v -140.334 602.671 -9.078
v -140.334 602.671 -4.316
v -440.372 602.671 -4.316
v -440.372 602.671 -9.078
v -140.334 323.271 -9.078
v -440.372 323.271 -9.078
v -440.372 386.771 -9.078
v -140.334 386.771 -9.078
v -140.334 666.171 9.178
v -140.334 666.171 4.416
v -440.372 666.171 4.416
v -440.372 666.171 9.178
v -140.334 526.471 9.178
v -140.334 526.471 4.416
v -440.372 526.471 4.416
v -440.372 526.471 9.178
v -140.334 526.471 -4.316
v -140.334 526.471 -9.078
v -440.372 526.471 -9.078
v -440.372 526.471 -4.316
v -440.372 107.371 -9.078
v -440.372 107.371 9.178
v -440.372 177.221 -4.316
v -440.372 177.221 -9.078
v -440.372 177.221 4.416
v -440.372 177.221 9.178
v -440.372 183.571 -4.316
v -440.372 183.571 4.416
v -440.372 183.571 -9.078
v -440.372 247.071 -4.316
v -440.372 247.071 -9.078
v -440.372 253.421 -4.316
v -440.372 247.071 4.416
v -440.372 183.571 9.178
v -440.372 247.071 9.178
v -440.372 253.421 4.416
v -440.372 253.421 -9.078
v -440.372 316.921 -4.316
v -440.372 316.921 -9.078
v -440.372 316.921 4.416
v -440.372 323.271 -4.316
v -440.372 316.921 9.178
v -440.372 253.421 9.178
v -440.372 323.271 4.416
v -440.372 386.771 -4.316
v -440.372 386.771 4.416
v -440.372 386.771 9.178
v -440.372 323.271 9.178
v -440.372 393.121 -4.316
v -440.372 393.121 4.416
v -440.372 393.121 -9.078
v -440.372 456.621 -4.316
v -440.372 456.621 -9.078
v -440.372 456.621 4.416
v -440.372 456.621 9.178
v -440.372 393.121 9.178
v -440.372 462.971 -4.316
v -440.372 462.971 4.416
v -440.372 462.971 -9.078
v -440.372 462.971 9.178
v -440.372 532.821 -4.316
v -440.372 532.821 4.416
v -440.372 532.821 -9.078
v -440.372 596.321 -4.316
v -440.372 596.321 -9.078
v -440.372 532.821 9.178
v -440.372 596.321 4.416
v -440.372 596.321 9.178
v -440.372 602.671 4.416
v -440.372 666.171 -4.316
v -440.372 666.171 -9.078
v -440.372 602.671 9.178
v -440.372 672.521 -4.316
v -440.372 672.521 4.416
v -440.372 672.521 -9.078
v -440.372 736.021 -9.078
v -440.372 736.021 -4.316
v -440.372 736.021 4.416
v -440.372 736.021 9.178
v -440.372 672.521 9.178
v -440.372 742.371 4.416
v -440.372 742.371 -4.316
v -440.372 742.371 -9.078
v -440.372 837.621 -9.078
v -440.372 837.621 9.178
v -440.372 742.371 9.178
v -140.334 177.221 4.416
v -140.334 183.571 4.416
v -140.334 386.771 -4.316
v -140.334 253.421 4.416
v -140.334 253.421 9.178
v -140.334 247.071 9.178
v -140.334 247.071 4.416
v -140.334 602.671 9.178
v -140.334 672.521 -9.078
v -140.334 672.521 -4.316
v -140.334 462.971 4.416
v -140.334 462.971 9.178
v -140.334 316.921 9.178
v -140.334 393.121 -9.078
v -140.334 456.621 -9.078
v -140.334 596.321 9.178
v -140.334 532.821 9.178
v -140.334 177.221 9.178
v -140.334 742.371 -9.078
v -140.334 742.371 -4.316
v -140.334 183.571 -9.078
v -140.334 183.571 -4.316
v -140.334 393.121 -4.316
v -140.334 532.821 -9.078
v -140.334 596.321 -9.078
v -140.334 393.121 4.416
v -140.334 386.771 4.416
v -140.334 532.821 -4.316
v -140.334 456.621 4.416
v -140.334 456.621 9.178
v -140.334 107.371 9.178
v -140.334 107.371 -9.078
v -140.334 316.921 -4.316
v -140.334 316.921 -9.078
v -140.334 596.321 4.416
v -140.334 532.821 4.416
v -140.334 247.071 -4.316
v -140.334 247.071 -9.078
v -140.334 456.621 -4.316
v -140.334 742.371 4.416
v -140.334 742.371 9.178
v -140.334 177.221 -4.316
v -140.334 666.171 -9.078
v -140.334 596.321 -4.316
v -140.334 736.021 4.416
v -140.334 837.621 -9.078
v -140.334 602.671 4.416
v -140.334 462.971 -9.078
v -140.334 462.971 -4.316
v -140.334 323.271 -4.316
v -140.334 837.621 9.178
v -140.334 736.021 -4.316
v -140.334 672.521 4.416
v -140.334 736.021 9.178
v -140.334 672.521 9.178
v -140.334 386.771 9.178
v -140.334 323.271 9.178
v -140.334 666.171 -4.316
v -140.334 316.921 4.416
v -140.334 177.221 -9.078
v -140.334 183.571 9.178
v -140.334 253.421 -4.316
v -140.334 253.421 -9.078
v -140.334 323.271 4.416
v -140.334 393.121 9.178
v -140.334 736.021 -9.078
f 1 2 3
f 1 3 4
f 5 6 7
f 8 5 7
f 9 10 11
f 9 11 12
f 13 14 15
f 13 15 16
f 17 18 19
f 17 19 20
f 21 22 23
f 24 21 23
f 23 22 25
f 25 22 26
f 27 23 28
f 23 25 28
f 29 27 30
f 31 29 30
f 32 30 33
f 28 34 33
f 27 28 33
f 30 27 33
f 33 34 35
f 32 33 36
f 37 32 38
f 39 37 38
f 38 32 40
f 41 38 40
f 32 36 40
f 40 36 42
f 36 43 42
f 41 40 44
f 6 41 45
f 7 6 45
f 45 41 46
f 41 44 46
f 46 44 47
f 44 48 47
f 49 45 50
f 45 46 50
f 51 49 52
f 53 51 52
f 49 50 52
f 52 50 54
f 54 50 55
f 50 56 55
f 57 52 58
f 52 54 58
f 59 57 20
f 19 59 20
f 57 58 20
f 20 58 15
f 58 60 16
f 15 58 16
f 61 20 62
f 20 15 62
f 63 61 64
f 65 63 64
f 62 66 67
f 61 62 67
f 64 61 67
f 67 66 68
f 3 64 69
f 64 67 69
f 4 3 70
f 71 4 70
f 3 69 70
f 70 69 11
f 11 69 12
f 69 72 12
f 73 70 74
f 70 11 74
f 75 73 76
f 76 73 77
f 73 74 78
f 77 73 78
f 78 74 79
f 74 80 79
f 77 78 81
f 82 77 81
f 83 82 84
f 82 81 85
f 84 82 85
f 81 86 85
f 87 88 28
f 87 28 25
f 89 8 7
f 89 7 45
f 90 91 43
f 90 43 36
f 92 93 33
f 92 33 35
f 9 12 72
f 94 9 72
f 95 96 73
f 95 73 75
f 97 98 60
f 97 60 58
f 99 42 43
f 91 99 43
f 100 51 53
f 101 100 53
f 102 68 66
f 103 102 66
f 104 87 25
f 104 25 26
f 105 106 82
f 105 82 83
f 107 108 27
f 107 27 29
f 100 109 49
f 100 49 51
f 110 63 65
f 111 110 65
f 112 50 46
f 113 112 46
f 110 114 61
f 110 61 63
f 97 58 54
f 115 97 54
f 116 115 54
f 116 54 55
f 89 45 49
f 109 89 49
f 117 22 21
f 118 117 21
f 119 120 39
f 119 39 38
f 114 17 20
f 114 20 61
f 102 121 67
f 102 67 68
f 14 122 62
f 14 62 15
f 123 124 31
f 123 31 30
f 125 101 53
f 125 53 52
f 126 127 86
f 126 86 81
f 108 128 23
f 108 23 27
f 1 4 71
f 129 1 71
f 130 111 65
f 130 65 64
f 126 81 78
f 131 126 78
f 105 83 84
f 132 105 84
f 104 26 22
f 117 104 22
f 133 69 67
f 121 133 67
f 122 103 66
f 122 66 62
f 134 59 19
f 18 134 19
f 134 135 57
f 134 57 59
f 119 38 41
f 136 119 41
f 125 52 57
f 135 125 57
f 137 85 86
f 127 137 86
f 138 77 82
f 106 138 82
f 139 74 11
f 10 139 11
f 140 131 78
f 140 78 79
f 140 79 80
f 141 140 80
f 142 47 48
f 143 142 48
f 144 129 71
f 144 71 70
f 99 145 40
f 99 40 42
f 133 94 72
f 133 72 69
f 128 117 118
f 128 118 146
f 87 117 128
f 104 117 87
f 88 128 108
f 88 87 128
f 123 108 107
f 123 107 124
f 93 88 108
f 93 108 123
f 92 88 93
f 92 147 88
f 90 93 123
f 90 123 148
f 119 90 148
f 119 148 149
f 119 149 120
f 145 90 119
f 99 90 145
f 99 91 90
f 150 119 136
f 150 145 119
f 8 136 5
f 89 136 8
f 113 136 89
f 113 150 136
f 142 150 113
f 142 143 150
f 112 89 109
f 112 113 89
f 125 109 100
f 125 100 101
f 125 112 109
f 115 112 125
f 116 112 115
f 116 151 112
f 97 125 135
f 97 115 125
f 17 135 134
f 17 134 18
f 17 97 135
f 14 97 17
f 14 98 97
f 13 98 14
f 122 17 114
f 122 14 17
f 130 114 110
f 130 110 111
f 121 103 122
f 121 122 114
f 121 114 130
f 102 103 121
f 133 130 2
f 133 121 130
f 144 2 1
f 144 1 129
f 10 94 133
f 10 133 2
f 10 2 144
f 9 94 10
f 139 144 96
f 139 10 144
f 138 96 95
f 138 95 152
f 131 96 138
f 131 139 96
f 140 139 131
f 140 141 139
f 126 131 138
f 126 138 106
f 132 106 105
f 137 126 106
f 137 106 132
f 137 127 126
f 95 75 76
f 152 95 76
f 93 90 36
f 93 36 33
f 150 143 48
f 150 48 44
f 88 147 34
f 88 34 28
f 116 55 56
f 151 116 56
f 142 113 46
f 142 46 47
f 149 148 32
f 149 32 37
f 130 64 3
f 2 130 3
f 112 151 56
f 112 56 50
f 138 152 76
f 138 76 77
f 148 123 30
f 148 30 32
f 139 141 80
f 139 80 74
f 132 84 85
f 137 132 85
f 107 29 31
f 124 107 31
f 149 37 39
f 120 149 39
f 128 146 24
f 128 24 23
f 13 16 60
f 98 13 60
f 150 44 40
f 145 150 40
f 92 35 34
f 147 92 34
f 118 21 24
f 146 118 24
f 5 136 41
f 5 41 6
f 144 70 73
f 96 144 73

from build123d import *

# Parameters (mm, degrees)
PARTSCAB_REFERENCE_START = -1615.650675561
PARTSCAB_REFERENCE_DEPTH = 1475.316666667
SKETCH1_OUTSIDE_W        = 1806.569
SKETCH1_OUTSIDE_H        = 1061.502
SKETCH1_OUTSIDE_W_2      = 300.0375
SKETCH1_OUTSIDE_H_2      = 730.25
CUT_EXTRUDE1_DEPTH       = 1820.964329577


# Read off the part's stored shape, not the designer's step: PartsCab_Reference
with BuildPart() as part:
    # PartsCab_Reference outline → PartsCab_Reference (new body)
    with BuildSketch(Plane.YZ.offset(PARTSCAB_REFERENCE_START)):
        Polygon((107.371492578, 9.178125), (107.371492578, -9.078125), (177.221492578, -9.078125), (177.221492578, -4.315625), (183.571492578, -4.315625), (183.571492578, -9.078125), (247.071492578, -9.078125), (247.071492578, -4.315625), (253.421492578, -4.315625), (253.421492578, -9.078125), (316.921492578, -9.078125), (316.921492578, -4.315625), (323.271492578, -4.315625), (323.271492578, -9.078125), (386.771492578, -9.078125), (386.771492578, -4.315625), (393.121492578, -4.315625), (393.121492578, -9.078125), (456.621492578, -9.078125), (456.621492578, -4.315625), (462.971492578, -4.315625), (462.971492578, -9.078125), (526.471492578, -9.078125), (526.471492578, -4.315625), (532.821492578, -4.315625), (532.821492578, -9.078125), (596.321492578, -9.078125), (596.321492578, -4.315625), (602.671492578, -4.315625), (602.671492578, -9.078125), (666.171492578, -9.078125), (666.171492578, -4.315625), (672.521492578, -4.315625), (672.521492578, -9.078125), (736.021492578, -9.078125), (736.021492578, -4.315625), (742.371492578, -4.315625), (742.371492578, -9.078125), (837.621492578, -9.078125), (837.621492578, 9.178125), (742.371492578, 9.178125), (742.371492578, 4.415625), (736.021492578, 4.415625), (736.021492578, 9.178125), (672.521492578, 9.178125), (672.521492578, 4.415625), (666.171492578, 4.415625), (666.171492578, 9.178125), (602.671492578, 9.178125), (602.671492578, 4.415625), (596.321492578, 4.415625), (596.321492578, 9.178125), (532.821492578, 9.178125), (532.821492578, 4.415625), (526.471492578, 4.415625), (526.471492578, 9.178125), (462.971492578, 9.178125), (462.971492578, 4.415625), (456.621492578, 4.415625), (456.621492578, 9.178125), (393.121492578, 9.178125), (393.121492578, 4.415625), (386.771492578, 4.415625), (386.771492578, 9.178125), (323.271492578, 9.178125), (323.271492578, 4.415625), (316.921492578, 4.415625), (316.921492578, 9.178125), (253.421492578, 9.178125), (253.421492578, 4.415625), (247.071492578, 4.415625), (247.071492578, 9.178125), (183.571492578, 9.178125), (183.571492578, 4.415625), (177.221492578, 4.415625), (177.221492578, 9.178125), align=None)
    extrude(amount=PARTSCAB_REFERENCE_DEPTH)

    # Sketch1 outside → Cut-Extrude1 (cut, through all)
    with BuildSketch(Plane.XY.offset(9.178125)):
        with Locations((-877.9925, 472.496)):
            Rectangle(SKETCH1_OUTSIDE_W, SKETCH1_OUTSIDE_H)
        with Locations((-290.352758894, 472.496492578)):
            Rectangle(SKETCH1_OUTSIDE_W_2, SKETCH1_OUTSIDE_H_2, mode=Mode.SUBTRACT)
    extrude(amount=-CUT_EXTRUDE1_DEPTH, mode=Mode.SUBTRACT)


solid = part.part
